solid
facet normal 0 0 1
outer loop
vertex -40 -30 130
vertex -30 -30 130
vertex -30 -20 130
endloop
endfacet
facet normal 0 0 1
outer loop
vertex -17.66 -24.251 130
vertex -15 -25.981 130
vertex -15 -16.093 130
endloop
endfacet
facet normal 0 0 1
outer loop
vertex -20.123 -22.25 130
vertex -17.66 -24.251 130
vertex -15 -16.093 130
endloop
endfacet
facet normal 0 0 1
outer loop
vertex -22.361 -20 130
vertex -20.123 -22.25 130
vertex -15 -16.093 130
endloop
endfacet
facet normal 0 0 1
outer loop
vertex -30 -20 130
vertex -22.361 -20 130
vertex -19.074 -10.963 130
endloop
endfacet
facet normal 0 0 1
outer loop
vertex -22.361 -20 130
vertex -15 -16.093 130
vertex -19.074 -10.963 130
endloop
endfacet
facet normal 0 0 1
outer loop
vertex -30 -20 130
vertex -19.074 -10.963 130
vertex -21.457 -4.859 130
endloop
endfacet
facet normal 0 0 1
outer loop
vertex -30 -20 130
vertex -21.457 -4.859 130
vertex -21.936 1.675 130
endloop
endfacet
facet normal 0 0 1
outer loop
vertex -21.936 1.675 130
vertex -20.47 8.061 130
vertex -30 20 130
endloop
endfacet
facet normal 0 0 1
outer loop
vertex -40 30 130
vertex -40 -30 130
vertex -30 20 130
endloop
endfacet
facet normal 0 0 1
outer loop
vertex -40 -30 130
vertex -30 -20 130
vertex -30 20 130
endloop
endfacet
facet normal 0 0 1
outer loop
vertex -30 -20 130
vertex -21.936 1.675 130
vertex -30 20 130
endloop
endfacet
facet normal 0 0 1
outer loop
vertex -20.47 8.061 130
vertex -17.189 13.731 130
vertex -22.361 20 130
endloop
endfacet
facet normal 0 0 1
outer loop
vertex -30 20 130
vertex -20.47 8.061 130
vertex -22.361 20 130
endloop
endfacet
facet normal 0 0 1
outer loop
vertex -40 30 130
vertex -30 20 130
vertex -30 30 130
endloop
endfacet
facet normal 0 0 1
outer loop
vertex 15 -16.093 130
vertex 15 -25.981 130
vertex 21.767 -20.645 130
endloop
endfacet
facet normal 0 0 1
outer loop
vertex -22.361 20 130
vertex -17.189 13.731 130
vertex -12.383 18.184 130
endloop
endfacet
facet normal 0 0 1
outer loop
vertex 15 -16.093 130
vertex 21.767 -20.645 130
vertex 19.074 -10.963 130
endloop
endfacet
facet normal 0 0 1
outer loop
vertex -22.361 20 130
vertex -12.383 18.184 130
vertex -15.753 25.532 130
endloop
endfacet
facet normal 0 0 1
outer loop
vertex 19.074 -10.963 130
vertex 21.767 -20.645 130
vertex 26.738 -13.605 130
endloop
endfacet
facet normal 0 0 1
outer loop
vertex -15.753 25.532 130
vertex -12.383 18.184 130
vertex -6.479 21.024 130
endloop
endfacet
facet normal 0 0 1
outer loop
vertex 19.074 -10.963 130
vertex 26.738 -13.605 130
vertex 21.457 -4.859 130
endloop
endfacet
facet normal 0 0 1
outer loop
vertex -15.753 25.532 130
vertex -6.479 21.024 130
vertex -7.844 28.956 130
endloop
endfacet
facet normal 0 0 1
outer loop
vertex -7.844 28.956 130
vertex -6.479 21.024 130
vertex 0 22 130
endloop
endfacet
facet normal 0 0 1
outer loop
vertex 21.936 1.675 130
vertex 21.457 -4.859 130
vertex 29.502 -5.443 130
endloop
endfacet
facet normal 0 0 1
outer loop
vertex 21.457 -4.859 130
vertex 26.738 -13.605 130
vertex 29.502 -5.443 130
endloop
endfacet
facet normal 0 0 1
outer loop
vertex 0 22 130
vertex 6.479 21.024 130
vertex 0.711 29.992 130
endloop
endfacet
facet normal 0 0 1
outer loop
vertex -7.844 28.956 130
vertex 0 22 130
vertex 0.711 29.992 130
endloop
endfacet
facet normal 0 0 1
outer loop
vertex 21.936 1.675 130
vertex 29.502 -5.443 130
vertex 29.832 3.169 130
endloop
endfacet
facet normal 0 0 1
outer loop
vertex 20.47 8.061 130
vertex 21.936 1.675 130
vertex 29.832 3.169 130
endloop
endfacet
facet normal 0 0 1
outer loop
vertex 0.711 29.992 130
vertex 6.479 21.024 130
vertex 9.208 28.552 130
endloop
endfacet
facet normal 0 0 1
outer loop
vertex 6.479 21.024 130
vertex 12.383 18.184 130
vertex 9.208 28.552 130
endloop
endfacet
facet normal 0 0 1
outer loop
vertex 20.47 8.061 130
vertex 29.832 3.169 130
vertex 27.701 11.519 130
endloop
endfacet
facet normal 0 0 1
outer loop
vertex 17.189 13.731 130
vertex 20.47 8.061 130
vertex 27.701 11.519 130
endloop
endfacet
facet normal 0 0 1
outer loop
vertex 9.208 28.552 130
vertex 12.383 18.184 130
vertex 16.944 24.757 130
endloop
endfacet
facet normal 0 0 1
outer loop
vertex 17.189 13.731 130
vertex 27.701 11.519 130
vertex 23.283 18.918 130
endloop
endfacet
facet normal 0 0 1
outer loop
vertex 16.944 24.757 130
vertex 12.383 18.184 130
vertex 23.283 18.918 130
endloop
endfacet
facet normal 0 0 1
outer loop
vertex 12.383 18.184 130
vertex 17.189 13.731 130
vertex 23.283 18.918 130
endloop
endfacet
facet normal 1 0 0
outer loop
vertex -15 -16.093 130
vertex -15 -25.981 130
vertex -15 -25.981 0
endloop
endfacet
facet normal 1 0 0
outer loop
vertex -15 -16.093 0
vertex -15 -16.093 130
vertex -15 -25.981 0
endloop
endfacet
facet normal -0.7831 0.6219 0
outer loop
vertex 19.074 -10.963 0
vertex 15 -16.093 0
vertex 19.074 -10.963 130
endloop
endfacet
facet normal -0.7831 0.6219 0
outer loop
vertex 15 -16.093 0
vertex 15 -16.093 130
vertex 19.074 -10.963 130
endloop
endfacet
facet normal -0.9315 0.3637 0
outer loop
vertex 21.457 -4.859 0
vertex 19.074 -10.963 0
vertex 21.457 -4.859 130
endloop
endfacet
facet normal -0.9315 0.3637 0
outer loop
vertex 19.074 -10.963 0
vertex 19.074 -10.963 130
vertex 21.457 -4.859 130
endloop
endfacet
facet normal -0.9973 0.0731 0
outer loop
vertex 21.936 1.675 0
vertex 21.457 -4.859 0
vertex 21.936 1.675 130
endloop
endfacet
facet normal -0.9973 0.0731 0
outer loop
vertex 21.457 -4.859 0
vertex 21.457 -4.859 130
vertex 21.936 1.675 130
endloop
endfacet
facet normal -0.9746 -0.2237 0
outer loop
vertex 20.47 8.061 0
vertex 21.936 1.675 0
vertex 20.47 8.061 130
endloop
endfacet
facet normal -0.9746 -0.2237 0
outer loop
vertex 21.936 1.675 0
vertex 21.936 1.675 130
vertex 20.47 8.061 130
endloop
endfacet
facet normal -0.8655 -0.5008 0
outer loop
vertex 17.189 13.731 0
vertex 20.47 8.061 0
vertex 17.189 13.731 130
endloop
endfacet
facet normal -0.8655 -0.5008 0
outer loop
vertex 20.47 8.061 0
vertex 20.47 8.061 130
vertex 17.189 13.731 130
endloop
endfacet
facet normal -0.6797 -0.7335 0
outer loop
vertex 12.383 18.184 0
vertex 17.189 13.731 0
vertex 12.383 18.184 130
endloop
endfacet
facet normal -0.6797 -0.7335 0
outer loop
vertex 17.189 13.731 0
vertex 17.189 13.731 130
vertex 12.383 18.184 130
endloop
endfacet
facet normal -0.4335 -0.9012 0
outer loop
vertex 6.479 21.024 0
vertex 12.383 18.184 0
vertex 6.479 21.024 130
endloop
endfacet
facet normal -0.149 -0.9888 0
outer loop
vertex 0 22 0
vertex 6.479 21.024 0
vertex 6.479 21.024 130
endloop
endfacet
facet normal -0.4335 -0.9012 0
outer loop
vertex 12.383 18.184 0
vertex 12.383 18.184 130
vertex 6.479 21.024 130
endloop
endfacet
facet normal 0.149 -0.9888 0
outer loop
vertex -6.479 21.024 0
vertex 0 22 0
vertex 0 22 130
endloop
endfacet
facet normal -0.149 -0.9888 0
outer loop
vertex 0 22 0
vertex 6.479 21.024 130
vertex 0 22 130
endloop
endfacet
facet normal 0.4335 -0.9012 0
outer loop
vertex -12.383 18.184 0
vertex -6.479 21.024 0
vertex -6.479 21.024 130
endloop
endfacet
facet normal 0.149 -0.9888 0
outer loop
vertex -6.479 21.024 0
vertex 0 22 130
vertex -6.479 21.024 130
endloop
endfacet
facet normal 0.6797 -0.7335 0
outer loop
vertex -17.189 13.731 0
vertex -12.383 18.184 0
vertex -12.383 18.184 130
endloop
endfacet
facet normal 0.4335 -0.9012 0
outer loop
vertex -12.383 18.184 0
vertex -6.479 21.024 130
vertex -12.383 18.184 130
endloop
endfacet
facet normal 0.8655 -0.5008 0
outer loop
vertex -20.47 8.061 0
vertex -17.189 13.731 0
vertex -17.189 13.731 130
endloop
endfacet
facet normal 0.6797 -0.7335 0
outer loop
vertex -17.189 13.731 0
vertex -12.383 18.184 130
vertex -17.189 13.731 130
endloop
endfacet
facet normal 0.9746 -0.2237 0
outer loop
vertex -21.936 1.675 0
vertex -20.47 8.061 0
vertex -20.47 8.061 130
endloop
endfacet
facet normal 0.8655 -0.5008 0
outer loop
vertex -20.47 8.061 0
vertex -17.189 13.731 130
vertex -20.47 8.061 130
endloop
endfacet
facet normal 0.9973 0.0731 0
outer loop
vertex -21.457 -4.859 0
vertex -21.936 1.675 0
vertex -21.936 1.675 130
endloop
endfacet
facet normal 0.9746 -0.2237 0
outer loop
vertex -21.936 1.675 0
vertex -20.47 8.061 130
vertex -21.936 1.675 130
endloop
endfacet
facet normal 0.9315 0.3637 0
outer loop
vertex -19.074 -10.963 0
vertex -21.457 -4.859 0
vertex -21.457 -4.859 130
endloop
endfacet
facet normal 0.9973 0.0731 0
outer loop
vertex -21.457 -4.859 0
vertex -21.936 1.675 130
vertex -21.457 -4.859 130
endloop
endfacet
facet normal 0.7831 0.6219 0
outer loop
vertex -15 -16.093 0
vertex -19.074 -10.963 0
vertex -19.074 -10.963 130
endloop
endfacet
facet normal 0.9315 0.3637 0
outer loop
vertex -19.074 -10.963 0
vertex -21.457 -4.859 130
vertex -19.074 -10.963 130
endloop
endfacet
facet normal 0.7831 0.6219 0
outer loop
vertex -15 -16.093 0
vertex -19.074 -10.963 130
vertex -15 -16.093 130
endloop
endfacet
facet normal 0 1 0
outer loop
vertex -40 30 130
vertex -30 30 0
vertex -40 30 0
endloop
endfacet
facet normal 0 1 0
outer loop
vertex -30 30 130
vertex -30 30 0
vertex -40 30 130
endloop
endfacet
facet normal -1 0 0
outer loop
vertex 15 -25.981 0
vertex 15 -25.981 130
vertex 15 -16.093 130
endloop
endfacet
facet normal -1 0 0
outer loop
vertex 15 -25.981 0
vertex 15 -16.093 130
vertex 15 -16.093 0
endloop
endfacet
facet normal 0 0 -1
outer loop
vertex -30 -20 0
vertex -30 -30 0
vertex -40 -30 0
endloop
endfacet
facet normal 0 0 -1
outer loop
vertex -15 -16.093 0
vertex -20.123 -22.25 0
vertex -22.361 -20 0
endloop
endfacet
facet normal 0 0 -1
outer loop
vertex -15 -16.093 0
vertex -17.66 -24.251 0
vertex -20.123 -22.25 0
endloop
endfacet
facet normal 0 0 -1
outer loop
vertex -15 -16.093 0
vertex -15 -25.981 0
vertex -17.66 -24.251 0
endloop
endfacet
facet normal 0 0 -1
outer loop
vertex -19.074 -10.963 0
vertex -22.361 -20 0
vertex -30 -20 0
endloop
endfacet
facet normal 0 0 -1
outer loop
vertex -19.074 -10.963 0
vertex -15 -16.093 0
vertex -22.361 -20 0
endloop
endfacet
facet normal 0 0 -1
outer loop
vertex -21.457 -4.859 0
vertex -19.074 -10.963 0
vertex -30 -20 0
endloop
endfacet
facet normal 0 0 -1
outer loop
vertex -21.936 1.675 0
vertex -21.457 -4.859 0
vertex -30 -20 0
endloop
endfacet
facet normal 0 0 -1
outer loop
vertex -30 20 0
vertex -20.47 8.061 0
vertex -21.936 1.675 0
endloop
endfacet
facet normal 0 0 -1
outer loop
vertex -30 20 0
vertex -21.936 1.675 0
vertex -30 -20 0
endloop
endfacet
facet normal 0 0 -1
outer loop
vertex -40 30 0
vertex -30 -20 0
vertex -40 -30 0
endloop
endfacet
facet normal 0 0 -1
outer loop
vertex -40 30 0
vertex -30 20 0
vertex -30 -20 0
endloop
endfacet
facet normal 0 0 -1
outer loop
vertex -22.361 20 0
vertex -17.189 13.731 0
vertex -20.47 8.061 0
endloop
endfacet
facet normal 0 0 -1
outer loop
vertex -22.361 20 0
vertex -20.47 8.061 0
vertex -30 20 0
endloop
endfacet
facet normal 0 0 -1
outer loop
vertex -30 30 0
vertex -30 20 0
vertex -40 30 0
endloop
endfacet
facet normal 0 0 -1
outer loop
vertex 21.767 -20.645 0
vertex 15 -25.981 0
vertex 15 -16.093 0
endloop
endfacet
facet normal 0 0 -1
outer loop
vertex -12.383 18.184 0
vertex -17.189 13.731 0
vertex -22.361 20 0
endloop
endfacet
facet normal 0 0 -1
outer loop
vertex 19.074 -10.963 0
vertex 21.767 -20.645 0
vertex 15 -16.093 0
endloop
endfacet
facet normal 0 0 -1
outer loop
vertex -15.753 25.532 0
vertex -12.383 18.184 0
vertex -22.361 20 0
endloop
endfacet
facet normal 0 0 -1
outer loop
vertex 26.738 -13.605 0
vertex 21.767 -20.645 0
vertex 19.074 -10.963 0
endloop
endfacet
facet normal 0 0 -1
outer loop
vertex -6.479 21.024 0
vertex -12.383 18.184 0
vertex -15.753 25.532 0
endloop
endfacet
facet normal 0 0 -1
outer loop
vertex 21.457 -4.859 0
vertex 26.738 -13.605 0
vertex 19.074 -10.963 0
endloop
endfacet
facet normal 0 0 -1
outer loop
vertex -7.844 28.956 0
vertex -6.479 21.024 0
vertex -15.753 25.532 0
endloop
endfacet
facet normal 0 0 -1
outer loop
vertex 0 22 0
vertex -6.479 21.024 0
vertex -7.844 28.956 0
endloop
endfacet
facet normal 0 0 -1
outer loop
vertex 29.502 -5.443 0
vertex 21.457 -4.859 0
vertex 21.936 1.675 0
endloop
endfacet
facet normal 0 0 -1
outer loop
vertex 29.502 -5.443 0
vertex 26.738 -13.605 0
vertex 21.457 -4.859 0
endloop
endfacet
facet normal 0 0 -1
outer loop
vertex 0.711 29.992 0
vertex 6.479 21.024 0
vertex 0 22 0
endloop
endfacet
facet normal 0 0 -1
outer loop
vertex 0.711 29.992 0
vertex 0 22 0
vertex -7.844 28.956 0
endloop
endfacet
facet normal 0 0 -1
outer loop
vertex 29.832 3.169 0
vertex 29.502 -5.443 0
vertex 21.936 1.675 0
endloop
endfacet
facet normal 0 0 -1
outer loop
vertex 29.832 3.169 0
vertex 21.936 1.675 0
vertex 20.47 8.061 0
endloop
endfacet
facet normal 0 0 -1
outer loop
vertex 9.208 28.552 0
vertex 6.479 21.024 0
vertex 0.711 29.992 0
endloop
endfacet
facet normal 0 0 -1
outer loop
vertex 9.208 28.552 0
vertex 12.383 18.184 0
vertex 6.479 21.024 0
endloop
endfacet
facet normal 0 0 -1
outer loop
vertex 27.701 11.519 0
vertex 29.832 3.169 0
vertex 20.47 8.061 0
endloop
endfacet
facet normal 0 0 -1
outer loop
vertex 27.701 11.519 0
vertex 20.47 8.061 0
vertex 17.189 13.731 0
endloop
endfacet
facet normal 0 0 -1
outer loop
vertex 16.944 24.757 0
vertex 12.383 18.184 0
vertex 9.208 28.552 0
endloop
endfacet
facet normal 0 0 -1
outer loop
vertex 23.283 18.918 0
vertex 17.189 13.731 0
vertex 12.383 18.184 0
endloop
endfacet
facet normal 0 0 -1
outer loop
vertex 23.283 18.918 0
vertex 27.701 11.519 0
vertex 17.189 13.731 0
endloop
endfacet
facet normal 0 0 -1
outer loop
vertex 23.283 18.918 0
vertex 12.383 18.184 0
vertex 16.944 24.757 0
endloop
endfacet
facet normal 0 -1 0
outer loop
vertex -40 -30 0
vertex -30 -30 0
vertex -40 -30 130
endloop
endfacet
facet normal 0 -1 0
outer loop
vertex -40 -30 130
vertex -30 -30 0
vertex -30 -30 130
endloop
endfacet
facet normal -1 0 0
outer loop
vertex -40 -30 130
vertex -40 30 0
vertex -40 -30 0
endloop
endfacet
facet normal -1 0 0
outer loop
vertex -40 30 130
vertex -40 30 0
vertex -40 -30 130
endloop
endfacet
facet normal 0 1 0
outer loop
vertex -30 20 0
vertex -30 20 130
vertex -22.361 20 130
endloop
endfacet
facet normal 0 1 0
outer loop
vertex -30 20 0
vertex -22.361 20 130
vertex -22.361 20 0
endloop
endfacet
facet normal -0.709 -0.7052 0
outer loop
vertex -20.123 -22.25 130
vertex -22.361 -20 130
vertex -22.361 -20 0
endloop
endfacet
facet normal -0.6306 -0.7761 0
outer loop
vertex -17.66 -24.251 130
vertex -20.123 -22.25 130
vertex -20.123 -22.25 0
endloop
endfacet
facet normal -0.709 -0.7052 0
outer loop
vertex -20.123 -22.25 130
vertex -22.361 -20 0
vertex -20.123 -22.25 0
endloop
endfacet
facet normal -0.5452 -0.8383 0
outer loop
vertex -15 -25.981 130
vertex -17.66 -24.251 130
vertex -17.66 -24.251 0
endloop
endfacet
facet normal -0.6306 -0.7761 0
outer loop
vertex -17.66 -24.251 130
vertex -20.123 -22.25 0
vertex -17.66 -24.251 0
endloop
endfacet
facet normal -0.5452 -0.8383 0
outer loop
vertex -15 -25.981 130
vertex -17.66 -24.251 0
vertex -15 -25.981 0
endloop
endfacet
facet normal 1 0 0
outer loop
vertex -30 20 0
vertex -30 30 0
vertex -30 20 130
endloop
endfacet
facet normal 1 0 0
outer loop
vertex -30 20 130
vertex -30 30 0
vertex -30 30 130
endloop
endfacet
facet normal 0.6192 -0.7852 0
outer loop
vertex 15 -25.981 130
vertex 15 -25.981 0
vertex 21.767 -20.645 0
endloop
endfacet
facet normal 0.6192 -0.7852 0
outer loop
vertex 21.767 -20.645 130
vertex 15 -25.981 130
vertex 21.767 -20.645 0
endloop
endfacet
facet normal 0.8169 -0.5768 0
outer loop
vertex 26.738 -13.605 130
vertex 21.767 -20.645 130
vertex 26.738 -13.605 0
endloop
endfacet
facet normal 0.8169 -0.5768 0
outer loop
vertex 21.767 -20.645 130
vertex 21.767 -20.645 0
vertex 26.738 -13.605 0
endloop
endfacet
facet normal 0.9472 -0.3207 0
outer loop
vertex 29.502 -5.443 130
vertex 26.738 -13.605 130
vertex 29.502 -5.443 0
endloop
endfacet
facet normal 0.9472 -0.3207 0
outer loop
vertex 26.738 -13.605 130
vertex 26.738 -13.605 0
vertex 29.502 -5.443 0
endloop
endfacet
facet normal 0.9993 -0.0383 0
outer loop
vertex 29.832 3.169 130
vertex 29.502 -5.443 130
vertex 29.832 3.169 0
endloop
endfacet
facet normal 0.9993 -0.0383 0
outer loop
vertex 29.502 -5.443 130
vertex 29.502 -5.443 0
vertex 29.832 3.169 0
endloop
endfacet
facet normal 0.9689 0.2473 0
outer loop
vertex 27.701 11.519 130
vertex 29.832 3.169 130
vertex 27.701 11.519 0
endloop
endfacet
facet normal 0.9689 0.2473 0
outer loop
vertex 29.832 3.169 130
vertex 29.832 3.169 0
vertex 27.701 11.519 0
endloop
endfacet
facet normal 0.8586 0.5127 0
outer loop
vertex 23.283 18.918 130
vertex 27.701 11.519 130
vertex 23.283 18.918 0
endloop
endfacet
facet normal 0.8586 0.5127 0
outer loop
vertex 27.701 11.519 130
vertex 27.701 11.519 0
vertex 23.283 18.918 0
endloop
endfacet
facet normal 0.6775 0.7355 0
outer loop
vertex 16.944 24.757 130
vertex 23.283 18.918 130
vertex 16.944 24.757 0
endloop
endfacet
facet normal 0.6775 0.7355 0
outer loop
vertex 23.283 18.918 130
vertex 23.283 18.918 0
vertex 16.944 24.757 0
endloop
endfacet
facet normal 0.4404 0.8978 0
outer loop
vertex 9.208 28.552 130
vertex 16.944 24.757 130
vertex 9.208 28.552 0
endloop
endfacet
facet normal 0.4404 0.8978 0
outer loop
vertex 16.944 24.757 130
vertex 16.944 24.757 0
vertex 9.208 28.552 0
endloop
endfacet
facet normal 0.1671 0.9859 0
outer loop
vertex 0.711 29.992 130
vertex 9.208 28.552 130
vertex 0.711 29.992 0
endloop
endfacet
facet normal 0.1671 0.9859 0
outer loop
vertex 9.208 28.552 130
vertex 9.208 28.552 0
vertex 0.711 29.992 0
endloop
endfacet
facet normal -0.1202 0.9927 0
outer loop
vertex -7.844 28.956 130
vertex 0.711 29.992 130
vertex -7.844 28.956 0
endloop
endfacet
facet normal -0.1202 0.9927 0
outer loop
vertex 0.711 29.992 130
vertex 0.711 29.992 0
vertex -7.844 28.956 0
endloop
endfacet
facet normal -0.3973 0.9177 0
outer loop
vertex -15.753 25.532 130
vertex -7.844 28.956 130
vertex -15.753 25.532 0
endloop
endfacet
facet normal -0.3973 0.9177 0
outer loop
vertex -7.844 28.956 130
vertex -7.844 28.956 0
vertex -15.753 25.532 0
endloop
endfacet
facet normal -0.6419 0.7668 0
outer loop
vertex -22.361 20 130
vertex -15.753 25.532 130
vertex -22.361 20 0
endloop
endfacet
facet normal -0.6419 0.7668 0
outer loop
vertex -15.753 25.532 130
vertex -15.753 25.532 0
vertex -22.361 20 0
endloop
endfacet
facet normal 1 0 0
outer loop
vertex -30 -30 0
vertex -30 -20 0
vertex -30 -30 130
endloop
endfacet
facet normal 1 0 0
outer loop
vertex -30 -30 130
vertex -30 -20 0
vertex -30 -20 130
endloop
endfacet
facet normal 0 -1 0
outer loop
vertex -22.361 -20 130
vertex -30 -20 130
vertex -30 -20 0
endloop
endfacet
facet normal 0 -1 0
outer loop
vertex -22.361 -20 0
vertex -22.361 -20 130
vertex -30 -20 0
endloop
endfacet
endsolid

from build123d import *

# Parameters (mm, degrees)
SKETCH2_R           = 30
BOSS_EXTRUDE2_DEPTH = 130
SKETCH3_R           = 22
CUT_EXTRUDE1_DEPTH  = 131
CUT_EXTRUDE2_REACH  = 62
SKETCH4_W           = 30
SKETCH4_H           = 140
SKETCH5_W           = 130
SKETCH5_H           = 40
BOSS_EXTRUDE3_DEPTH = 7.63932
SKETCH6_W           = 130
SKETCH6_H           = 60
BOSS_EXTRUDE4_DEPTH = 10


with BuildPart() as part:
    # Sketch2 → Boss-Extrude2 (new body)
    with BuildSketch(Plane.XY):
        Circle(SKETCH2_R)
    extrude(amount=BOSS_EXTRUDE2_DEPTH)

    # Sketch3 → Cut-Extrude1 (cut, through all)
    with BuildSketch(Plane.XY.offset(130)):
        Circle(SKETCH3_R)
    extrude(amount=-CUT_EXTRUDE1_DEPTH, mode=Mode.SUBTRACT)

    # Sketch4 → Cut-Extrude2 (cut, up to next)
    with BuildSketch(Plane(origin=(0, -30, 0), x_dir=(1, 0, 0), z_dir=(0, 1, 0)), mode=Mode.PRIVATE) as cut_extrude2_sk1:
        with Locations((0, -70)):
            Rectangle(SKETCH4_W, SKETCH4_H)
    cut_extrude2_tool1 = extrude(cut_extrude2_sk1.sketch, amount=CUT_EXTRUDE2_REACH, mode=Mode.PRIVATE) & part.part
    add(cut_extrude2_tool1.solids().sort_by_distance((0, -30, 70))[0], mode=Mode.SUBTRACT)

    # Sketch5 → Boss-Extrude3 (add)
    with BuildSketch(Plane(origin=(-30, 0, 0), x_dir=(0, 0, -1), z_dir=(1, 0, 0))):
        with Locations((-65, 0)):
            Rectangle(SKETCH5_W, SKETCH5_H)
    extrude(amount=BOSS_EXTRUDE3_DEPTH)

    # Sketch6 → Boss-Extrude4 (add)
    with BuildSketch(Plane.ZY.offset(30)):
        with Locations((65, 0)):
            Rectangle(SKETCH6_W, SKETCH6_H)
    extrude(amount=BOSS_EXTRUDE4_DEPTH)


solid = part.part
